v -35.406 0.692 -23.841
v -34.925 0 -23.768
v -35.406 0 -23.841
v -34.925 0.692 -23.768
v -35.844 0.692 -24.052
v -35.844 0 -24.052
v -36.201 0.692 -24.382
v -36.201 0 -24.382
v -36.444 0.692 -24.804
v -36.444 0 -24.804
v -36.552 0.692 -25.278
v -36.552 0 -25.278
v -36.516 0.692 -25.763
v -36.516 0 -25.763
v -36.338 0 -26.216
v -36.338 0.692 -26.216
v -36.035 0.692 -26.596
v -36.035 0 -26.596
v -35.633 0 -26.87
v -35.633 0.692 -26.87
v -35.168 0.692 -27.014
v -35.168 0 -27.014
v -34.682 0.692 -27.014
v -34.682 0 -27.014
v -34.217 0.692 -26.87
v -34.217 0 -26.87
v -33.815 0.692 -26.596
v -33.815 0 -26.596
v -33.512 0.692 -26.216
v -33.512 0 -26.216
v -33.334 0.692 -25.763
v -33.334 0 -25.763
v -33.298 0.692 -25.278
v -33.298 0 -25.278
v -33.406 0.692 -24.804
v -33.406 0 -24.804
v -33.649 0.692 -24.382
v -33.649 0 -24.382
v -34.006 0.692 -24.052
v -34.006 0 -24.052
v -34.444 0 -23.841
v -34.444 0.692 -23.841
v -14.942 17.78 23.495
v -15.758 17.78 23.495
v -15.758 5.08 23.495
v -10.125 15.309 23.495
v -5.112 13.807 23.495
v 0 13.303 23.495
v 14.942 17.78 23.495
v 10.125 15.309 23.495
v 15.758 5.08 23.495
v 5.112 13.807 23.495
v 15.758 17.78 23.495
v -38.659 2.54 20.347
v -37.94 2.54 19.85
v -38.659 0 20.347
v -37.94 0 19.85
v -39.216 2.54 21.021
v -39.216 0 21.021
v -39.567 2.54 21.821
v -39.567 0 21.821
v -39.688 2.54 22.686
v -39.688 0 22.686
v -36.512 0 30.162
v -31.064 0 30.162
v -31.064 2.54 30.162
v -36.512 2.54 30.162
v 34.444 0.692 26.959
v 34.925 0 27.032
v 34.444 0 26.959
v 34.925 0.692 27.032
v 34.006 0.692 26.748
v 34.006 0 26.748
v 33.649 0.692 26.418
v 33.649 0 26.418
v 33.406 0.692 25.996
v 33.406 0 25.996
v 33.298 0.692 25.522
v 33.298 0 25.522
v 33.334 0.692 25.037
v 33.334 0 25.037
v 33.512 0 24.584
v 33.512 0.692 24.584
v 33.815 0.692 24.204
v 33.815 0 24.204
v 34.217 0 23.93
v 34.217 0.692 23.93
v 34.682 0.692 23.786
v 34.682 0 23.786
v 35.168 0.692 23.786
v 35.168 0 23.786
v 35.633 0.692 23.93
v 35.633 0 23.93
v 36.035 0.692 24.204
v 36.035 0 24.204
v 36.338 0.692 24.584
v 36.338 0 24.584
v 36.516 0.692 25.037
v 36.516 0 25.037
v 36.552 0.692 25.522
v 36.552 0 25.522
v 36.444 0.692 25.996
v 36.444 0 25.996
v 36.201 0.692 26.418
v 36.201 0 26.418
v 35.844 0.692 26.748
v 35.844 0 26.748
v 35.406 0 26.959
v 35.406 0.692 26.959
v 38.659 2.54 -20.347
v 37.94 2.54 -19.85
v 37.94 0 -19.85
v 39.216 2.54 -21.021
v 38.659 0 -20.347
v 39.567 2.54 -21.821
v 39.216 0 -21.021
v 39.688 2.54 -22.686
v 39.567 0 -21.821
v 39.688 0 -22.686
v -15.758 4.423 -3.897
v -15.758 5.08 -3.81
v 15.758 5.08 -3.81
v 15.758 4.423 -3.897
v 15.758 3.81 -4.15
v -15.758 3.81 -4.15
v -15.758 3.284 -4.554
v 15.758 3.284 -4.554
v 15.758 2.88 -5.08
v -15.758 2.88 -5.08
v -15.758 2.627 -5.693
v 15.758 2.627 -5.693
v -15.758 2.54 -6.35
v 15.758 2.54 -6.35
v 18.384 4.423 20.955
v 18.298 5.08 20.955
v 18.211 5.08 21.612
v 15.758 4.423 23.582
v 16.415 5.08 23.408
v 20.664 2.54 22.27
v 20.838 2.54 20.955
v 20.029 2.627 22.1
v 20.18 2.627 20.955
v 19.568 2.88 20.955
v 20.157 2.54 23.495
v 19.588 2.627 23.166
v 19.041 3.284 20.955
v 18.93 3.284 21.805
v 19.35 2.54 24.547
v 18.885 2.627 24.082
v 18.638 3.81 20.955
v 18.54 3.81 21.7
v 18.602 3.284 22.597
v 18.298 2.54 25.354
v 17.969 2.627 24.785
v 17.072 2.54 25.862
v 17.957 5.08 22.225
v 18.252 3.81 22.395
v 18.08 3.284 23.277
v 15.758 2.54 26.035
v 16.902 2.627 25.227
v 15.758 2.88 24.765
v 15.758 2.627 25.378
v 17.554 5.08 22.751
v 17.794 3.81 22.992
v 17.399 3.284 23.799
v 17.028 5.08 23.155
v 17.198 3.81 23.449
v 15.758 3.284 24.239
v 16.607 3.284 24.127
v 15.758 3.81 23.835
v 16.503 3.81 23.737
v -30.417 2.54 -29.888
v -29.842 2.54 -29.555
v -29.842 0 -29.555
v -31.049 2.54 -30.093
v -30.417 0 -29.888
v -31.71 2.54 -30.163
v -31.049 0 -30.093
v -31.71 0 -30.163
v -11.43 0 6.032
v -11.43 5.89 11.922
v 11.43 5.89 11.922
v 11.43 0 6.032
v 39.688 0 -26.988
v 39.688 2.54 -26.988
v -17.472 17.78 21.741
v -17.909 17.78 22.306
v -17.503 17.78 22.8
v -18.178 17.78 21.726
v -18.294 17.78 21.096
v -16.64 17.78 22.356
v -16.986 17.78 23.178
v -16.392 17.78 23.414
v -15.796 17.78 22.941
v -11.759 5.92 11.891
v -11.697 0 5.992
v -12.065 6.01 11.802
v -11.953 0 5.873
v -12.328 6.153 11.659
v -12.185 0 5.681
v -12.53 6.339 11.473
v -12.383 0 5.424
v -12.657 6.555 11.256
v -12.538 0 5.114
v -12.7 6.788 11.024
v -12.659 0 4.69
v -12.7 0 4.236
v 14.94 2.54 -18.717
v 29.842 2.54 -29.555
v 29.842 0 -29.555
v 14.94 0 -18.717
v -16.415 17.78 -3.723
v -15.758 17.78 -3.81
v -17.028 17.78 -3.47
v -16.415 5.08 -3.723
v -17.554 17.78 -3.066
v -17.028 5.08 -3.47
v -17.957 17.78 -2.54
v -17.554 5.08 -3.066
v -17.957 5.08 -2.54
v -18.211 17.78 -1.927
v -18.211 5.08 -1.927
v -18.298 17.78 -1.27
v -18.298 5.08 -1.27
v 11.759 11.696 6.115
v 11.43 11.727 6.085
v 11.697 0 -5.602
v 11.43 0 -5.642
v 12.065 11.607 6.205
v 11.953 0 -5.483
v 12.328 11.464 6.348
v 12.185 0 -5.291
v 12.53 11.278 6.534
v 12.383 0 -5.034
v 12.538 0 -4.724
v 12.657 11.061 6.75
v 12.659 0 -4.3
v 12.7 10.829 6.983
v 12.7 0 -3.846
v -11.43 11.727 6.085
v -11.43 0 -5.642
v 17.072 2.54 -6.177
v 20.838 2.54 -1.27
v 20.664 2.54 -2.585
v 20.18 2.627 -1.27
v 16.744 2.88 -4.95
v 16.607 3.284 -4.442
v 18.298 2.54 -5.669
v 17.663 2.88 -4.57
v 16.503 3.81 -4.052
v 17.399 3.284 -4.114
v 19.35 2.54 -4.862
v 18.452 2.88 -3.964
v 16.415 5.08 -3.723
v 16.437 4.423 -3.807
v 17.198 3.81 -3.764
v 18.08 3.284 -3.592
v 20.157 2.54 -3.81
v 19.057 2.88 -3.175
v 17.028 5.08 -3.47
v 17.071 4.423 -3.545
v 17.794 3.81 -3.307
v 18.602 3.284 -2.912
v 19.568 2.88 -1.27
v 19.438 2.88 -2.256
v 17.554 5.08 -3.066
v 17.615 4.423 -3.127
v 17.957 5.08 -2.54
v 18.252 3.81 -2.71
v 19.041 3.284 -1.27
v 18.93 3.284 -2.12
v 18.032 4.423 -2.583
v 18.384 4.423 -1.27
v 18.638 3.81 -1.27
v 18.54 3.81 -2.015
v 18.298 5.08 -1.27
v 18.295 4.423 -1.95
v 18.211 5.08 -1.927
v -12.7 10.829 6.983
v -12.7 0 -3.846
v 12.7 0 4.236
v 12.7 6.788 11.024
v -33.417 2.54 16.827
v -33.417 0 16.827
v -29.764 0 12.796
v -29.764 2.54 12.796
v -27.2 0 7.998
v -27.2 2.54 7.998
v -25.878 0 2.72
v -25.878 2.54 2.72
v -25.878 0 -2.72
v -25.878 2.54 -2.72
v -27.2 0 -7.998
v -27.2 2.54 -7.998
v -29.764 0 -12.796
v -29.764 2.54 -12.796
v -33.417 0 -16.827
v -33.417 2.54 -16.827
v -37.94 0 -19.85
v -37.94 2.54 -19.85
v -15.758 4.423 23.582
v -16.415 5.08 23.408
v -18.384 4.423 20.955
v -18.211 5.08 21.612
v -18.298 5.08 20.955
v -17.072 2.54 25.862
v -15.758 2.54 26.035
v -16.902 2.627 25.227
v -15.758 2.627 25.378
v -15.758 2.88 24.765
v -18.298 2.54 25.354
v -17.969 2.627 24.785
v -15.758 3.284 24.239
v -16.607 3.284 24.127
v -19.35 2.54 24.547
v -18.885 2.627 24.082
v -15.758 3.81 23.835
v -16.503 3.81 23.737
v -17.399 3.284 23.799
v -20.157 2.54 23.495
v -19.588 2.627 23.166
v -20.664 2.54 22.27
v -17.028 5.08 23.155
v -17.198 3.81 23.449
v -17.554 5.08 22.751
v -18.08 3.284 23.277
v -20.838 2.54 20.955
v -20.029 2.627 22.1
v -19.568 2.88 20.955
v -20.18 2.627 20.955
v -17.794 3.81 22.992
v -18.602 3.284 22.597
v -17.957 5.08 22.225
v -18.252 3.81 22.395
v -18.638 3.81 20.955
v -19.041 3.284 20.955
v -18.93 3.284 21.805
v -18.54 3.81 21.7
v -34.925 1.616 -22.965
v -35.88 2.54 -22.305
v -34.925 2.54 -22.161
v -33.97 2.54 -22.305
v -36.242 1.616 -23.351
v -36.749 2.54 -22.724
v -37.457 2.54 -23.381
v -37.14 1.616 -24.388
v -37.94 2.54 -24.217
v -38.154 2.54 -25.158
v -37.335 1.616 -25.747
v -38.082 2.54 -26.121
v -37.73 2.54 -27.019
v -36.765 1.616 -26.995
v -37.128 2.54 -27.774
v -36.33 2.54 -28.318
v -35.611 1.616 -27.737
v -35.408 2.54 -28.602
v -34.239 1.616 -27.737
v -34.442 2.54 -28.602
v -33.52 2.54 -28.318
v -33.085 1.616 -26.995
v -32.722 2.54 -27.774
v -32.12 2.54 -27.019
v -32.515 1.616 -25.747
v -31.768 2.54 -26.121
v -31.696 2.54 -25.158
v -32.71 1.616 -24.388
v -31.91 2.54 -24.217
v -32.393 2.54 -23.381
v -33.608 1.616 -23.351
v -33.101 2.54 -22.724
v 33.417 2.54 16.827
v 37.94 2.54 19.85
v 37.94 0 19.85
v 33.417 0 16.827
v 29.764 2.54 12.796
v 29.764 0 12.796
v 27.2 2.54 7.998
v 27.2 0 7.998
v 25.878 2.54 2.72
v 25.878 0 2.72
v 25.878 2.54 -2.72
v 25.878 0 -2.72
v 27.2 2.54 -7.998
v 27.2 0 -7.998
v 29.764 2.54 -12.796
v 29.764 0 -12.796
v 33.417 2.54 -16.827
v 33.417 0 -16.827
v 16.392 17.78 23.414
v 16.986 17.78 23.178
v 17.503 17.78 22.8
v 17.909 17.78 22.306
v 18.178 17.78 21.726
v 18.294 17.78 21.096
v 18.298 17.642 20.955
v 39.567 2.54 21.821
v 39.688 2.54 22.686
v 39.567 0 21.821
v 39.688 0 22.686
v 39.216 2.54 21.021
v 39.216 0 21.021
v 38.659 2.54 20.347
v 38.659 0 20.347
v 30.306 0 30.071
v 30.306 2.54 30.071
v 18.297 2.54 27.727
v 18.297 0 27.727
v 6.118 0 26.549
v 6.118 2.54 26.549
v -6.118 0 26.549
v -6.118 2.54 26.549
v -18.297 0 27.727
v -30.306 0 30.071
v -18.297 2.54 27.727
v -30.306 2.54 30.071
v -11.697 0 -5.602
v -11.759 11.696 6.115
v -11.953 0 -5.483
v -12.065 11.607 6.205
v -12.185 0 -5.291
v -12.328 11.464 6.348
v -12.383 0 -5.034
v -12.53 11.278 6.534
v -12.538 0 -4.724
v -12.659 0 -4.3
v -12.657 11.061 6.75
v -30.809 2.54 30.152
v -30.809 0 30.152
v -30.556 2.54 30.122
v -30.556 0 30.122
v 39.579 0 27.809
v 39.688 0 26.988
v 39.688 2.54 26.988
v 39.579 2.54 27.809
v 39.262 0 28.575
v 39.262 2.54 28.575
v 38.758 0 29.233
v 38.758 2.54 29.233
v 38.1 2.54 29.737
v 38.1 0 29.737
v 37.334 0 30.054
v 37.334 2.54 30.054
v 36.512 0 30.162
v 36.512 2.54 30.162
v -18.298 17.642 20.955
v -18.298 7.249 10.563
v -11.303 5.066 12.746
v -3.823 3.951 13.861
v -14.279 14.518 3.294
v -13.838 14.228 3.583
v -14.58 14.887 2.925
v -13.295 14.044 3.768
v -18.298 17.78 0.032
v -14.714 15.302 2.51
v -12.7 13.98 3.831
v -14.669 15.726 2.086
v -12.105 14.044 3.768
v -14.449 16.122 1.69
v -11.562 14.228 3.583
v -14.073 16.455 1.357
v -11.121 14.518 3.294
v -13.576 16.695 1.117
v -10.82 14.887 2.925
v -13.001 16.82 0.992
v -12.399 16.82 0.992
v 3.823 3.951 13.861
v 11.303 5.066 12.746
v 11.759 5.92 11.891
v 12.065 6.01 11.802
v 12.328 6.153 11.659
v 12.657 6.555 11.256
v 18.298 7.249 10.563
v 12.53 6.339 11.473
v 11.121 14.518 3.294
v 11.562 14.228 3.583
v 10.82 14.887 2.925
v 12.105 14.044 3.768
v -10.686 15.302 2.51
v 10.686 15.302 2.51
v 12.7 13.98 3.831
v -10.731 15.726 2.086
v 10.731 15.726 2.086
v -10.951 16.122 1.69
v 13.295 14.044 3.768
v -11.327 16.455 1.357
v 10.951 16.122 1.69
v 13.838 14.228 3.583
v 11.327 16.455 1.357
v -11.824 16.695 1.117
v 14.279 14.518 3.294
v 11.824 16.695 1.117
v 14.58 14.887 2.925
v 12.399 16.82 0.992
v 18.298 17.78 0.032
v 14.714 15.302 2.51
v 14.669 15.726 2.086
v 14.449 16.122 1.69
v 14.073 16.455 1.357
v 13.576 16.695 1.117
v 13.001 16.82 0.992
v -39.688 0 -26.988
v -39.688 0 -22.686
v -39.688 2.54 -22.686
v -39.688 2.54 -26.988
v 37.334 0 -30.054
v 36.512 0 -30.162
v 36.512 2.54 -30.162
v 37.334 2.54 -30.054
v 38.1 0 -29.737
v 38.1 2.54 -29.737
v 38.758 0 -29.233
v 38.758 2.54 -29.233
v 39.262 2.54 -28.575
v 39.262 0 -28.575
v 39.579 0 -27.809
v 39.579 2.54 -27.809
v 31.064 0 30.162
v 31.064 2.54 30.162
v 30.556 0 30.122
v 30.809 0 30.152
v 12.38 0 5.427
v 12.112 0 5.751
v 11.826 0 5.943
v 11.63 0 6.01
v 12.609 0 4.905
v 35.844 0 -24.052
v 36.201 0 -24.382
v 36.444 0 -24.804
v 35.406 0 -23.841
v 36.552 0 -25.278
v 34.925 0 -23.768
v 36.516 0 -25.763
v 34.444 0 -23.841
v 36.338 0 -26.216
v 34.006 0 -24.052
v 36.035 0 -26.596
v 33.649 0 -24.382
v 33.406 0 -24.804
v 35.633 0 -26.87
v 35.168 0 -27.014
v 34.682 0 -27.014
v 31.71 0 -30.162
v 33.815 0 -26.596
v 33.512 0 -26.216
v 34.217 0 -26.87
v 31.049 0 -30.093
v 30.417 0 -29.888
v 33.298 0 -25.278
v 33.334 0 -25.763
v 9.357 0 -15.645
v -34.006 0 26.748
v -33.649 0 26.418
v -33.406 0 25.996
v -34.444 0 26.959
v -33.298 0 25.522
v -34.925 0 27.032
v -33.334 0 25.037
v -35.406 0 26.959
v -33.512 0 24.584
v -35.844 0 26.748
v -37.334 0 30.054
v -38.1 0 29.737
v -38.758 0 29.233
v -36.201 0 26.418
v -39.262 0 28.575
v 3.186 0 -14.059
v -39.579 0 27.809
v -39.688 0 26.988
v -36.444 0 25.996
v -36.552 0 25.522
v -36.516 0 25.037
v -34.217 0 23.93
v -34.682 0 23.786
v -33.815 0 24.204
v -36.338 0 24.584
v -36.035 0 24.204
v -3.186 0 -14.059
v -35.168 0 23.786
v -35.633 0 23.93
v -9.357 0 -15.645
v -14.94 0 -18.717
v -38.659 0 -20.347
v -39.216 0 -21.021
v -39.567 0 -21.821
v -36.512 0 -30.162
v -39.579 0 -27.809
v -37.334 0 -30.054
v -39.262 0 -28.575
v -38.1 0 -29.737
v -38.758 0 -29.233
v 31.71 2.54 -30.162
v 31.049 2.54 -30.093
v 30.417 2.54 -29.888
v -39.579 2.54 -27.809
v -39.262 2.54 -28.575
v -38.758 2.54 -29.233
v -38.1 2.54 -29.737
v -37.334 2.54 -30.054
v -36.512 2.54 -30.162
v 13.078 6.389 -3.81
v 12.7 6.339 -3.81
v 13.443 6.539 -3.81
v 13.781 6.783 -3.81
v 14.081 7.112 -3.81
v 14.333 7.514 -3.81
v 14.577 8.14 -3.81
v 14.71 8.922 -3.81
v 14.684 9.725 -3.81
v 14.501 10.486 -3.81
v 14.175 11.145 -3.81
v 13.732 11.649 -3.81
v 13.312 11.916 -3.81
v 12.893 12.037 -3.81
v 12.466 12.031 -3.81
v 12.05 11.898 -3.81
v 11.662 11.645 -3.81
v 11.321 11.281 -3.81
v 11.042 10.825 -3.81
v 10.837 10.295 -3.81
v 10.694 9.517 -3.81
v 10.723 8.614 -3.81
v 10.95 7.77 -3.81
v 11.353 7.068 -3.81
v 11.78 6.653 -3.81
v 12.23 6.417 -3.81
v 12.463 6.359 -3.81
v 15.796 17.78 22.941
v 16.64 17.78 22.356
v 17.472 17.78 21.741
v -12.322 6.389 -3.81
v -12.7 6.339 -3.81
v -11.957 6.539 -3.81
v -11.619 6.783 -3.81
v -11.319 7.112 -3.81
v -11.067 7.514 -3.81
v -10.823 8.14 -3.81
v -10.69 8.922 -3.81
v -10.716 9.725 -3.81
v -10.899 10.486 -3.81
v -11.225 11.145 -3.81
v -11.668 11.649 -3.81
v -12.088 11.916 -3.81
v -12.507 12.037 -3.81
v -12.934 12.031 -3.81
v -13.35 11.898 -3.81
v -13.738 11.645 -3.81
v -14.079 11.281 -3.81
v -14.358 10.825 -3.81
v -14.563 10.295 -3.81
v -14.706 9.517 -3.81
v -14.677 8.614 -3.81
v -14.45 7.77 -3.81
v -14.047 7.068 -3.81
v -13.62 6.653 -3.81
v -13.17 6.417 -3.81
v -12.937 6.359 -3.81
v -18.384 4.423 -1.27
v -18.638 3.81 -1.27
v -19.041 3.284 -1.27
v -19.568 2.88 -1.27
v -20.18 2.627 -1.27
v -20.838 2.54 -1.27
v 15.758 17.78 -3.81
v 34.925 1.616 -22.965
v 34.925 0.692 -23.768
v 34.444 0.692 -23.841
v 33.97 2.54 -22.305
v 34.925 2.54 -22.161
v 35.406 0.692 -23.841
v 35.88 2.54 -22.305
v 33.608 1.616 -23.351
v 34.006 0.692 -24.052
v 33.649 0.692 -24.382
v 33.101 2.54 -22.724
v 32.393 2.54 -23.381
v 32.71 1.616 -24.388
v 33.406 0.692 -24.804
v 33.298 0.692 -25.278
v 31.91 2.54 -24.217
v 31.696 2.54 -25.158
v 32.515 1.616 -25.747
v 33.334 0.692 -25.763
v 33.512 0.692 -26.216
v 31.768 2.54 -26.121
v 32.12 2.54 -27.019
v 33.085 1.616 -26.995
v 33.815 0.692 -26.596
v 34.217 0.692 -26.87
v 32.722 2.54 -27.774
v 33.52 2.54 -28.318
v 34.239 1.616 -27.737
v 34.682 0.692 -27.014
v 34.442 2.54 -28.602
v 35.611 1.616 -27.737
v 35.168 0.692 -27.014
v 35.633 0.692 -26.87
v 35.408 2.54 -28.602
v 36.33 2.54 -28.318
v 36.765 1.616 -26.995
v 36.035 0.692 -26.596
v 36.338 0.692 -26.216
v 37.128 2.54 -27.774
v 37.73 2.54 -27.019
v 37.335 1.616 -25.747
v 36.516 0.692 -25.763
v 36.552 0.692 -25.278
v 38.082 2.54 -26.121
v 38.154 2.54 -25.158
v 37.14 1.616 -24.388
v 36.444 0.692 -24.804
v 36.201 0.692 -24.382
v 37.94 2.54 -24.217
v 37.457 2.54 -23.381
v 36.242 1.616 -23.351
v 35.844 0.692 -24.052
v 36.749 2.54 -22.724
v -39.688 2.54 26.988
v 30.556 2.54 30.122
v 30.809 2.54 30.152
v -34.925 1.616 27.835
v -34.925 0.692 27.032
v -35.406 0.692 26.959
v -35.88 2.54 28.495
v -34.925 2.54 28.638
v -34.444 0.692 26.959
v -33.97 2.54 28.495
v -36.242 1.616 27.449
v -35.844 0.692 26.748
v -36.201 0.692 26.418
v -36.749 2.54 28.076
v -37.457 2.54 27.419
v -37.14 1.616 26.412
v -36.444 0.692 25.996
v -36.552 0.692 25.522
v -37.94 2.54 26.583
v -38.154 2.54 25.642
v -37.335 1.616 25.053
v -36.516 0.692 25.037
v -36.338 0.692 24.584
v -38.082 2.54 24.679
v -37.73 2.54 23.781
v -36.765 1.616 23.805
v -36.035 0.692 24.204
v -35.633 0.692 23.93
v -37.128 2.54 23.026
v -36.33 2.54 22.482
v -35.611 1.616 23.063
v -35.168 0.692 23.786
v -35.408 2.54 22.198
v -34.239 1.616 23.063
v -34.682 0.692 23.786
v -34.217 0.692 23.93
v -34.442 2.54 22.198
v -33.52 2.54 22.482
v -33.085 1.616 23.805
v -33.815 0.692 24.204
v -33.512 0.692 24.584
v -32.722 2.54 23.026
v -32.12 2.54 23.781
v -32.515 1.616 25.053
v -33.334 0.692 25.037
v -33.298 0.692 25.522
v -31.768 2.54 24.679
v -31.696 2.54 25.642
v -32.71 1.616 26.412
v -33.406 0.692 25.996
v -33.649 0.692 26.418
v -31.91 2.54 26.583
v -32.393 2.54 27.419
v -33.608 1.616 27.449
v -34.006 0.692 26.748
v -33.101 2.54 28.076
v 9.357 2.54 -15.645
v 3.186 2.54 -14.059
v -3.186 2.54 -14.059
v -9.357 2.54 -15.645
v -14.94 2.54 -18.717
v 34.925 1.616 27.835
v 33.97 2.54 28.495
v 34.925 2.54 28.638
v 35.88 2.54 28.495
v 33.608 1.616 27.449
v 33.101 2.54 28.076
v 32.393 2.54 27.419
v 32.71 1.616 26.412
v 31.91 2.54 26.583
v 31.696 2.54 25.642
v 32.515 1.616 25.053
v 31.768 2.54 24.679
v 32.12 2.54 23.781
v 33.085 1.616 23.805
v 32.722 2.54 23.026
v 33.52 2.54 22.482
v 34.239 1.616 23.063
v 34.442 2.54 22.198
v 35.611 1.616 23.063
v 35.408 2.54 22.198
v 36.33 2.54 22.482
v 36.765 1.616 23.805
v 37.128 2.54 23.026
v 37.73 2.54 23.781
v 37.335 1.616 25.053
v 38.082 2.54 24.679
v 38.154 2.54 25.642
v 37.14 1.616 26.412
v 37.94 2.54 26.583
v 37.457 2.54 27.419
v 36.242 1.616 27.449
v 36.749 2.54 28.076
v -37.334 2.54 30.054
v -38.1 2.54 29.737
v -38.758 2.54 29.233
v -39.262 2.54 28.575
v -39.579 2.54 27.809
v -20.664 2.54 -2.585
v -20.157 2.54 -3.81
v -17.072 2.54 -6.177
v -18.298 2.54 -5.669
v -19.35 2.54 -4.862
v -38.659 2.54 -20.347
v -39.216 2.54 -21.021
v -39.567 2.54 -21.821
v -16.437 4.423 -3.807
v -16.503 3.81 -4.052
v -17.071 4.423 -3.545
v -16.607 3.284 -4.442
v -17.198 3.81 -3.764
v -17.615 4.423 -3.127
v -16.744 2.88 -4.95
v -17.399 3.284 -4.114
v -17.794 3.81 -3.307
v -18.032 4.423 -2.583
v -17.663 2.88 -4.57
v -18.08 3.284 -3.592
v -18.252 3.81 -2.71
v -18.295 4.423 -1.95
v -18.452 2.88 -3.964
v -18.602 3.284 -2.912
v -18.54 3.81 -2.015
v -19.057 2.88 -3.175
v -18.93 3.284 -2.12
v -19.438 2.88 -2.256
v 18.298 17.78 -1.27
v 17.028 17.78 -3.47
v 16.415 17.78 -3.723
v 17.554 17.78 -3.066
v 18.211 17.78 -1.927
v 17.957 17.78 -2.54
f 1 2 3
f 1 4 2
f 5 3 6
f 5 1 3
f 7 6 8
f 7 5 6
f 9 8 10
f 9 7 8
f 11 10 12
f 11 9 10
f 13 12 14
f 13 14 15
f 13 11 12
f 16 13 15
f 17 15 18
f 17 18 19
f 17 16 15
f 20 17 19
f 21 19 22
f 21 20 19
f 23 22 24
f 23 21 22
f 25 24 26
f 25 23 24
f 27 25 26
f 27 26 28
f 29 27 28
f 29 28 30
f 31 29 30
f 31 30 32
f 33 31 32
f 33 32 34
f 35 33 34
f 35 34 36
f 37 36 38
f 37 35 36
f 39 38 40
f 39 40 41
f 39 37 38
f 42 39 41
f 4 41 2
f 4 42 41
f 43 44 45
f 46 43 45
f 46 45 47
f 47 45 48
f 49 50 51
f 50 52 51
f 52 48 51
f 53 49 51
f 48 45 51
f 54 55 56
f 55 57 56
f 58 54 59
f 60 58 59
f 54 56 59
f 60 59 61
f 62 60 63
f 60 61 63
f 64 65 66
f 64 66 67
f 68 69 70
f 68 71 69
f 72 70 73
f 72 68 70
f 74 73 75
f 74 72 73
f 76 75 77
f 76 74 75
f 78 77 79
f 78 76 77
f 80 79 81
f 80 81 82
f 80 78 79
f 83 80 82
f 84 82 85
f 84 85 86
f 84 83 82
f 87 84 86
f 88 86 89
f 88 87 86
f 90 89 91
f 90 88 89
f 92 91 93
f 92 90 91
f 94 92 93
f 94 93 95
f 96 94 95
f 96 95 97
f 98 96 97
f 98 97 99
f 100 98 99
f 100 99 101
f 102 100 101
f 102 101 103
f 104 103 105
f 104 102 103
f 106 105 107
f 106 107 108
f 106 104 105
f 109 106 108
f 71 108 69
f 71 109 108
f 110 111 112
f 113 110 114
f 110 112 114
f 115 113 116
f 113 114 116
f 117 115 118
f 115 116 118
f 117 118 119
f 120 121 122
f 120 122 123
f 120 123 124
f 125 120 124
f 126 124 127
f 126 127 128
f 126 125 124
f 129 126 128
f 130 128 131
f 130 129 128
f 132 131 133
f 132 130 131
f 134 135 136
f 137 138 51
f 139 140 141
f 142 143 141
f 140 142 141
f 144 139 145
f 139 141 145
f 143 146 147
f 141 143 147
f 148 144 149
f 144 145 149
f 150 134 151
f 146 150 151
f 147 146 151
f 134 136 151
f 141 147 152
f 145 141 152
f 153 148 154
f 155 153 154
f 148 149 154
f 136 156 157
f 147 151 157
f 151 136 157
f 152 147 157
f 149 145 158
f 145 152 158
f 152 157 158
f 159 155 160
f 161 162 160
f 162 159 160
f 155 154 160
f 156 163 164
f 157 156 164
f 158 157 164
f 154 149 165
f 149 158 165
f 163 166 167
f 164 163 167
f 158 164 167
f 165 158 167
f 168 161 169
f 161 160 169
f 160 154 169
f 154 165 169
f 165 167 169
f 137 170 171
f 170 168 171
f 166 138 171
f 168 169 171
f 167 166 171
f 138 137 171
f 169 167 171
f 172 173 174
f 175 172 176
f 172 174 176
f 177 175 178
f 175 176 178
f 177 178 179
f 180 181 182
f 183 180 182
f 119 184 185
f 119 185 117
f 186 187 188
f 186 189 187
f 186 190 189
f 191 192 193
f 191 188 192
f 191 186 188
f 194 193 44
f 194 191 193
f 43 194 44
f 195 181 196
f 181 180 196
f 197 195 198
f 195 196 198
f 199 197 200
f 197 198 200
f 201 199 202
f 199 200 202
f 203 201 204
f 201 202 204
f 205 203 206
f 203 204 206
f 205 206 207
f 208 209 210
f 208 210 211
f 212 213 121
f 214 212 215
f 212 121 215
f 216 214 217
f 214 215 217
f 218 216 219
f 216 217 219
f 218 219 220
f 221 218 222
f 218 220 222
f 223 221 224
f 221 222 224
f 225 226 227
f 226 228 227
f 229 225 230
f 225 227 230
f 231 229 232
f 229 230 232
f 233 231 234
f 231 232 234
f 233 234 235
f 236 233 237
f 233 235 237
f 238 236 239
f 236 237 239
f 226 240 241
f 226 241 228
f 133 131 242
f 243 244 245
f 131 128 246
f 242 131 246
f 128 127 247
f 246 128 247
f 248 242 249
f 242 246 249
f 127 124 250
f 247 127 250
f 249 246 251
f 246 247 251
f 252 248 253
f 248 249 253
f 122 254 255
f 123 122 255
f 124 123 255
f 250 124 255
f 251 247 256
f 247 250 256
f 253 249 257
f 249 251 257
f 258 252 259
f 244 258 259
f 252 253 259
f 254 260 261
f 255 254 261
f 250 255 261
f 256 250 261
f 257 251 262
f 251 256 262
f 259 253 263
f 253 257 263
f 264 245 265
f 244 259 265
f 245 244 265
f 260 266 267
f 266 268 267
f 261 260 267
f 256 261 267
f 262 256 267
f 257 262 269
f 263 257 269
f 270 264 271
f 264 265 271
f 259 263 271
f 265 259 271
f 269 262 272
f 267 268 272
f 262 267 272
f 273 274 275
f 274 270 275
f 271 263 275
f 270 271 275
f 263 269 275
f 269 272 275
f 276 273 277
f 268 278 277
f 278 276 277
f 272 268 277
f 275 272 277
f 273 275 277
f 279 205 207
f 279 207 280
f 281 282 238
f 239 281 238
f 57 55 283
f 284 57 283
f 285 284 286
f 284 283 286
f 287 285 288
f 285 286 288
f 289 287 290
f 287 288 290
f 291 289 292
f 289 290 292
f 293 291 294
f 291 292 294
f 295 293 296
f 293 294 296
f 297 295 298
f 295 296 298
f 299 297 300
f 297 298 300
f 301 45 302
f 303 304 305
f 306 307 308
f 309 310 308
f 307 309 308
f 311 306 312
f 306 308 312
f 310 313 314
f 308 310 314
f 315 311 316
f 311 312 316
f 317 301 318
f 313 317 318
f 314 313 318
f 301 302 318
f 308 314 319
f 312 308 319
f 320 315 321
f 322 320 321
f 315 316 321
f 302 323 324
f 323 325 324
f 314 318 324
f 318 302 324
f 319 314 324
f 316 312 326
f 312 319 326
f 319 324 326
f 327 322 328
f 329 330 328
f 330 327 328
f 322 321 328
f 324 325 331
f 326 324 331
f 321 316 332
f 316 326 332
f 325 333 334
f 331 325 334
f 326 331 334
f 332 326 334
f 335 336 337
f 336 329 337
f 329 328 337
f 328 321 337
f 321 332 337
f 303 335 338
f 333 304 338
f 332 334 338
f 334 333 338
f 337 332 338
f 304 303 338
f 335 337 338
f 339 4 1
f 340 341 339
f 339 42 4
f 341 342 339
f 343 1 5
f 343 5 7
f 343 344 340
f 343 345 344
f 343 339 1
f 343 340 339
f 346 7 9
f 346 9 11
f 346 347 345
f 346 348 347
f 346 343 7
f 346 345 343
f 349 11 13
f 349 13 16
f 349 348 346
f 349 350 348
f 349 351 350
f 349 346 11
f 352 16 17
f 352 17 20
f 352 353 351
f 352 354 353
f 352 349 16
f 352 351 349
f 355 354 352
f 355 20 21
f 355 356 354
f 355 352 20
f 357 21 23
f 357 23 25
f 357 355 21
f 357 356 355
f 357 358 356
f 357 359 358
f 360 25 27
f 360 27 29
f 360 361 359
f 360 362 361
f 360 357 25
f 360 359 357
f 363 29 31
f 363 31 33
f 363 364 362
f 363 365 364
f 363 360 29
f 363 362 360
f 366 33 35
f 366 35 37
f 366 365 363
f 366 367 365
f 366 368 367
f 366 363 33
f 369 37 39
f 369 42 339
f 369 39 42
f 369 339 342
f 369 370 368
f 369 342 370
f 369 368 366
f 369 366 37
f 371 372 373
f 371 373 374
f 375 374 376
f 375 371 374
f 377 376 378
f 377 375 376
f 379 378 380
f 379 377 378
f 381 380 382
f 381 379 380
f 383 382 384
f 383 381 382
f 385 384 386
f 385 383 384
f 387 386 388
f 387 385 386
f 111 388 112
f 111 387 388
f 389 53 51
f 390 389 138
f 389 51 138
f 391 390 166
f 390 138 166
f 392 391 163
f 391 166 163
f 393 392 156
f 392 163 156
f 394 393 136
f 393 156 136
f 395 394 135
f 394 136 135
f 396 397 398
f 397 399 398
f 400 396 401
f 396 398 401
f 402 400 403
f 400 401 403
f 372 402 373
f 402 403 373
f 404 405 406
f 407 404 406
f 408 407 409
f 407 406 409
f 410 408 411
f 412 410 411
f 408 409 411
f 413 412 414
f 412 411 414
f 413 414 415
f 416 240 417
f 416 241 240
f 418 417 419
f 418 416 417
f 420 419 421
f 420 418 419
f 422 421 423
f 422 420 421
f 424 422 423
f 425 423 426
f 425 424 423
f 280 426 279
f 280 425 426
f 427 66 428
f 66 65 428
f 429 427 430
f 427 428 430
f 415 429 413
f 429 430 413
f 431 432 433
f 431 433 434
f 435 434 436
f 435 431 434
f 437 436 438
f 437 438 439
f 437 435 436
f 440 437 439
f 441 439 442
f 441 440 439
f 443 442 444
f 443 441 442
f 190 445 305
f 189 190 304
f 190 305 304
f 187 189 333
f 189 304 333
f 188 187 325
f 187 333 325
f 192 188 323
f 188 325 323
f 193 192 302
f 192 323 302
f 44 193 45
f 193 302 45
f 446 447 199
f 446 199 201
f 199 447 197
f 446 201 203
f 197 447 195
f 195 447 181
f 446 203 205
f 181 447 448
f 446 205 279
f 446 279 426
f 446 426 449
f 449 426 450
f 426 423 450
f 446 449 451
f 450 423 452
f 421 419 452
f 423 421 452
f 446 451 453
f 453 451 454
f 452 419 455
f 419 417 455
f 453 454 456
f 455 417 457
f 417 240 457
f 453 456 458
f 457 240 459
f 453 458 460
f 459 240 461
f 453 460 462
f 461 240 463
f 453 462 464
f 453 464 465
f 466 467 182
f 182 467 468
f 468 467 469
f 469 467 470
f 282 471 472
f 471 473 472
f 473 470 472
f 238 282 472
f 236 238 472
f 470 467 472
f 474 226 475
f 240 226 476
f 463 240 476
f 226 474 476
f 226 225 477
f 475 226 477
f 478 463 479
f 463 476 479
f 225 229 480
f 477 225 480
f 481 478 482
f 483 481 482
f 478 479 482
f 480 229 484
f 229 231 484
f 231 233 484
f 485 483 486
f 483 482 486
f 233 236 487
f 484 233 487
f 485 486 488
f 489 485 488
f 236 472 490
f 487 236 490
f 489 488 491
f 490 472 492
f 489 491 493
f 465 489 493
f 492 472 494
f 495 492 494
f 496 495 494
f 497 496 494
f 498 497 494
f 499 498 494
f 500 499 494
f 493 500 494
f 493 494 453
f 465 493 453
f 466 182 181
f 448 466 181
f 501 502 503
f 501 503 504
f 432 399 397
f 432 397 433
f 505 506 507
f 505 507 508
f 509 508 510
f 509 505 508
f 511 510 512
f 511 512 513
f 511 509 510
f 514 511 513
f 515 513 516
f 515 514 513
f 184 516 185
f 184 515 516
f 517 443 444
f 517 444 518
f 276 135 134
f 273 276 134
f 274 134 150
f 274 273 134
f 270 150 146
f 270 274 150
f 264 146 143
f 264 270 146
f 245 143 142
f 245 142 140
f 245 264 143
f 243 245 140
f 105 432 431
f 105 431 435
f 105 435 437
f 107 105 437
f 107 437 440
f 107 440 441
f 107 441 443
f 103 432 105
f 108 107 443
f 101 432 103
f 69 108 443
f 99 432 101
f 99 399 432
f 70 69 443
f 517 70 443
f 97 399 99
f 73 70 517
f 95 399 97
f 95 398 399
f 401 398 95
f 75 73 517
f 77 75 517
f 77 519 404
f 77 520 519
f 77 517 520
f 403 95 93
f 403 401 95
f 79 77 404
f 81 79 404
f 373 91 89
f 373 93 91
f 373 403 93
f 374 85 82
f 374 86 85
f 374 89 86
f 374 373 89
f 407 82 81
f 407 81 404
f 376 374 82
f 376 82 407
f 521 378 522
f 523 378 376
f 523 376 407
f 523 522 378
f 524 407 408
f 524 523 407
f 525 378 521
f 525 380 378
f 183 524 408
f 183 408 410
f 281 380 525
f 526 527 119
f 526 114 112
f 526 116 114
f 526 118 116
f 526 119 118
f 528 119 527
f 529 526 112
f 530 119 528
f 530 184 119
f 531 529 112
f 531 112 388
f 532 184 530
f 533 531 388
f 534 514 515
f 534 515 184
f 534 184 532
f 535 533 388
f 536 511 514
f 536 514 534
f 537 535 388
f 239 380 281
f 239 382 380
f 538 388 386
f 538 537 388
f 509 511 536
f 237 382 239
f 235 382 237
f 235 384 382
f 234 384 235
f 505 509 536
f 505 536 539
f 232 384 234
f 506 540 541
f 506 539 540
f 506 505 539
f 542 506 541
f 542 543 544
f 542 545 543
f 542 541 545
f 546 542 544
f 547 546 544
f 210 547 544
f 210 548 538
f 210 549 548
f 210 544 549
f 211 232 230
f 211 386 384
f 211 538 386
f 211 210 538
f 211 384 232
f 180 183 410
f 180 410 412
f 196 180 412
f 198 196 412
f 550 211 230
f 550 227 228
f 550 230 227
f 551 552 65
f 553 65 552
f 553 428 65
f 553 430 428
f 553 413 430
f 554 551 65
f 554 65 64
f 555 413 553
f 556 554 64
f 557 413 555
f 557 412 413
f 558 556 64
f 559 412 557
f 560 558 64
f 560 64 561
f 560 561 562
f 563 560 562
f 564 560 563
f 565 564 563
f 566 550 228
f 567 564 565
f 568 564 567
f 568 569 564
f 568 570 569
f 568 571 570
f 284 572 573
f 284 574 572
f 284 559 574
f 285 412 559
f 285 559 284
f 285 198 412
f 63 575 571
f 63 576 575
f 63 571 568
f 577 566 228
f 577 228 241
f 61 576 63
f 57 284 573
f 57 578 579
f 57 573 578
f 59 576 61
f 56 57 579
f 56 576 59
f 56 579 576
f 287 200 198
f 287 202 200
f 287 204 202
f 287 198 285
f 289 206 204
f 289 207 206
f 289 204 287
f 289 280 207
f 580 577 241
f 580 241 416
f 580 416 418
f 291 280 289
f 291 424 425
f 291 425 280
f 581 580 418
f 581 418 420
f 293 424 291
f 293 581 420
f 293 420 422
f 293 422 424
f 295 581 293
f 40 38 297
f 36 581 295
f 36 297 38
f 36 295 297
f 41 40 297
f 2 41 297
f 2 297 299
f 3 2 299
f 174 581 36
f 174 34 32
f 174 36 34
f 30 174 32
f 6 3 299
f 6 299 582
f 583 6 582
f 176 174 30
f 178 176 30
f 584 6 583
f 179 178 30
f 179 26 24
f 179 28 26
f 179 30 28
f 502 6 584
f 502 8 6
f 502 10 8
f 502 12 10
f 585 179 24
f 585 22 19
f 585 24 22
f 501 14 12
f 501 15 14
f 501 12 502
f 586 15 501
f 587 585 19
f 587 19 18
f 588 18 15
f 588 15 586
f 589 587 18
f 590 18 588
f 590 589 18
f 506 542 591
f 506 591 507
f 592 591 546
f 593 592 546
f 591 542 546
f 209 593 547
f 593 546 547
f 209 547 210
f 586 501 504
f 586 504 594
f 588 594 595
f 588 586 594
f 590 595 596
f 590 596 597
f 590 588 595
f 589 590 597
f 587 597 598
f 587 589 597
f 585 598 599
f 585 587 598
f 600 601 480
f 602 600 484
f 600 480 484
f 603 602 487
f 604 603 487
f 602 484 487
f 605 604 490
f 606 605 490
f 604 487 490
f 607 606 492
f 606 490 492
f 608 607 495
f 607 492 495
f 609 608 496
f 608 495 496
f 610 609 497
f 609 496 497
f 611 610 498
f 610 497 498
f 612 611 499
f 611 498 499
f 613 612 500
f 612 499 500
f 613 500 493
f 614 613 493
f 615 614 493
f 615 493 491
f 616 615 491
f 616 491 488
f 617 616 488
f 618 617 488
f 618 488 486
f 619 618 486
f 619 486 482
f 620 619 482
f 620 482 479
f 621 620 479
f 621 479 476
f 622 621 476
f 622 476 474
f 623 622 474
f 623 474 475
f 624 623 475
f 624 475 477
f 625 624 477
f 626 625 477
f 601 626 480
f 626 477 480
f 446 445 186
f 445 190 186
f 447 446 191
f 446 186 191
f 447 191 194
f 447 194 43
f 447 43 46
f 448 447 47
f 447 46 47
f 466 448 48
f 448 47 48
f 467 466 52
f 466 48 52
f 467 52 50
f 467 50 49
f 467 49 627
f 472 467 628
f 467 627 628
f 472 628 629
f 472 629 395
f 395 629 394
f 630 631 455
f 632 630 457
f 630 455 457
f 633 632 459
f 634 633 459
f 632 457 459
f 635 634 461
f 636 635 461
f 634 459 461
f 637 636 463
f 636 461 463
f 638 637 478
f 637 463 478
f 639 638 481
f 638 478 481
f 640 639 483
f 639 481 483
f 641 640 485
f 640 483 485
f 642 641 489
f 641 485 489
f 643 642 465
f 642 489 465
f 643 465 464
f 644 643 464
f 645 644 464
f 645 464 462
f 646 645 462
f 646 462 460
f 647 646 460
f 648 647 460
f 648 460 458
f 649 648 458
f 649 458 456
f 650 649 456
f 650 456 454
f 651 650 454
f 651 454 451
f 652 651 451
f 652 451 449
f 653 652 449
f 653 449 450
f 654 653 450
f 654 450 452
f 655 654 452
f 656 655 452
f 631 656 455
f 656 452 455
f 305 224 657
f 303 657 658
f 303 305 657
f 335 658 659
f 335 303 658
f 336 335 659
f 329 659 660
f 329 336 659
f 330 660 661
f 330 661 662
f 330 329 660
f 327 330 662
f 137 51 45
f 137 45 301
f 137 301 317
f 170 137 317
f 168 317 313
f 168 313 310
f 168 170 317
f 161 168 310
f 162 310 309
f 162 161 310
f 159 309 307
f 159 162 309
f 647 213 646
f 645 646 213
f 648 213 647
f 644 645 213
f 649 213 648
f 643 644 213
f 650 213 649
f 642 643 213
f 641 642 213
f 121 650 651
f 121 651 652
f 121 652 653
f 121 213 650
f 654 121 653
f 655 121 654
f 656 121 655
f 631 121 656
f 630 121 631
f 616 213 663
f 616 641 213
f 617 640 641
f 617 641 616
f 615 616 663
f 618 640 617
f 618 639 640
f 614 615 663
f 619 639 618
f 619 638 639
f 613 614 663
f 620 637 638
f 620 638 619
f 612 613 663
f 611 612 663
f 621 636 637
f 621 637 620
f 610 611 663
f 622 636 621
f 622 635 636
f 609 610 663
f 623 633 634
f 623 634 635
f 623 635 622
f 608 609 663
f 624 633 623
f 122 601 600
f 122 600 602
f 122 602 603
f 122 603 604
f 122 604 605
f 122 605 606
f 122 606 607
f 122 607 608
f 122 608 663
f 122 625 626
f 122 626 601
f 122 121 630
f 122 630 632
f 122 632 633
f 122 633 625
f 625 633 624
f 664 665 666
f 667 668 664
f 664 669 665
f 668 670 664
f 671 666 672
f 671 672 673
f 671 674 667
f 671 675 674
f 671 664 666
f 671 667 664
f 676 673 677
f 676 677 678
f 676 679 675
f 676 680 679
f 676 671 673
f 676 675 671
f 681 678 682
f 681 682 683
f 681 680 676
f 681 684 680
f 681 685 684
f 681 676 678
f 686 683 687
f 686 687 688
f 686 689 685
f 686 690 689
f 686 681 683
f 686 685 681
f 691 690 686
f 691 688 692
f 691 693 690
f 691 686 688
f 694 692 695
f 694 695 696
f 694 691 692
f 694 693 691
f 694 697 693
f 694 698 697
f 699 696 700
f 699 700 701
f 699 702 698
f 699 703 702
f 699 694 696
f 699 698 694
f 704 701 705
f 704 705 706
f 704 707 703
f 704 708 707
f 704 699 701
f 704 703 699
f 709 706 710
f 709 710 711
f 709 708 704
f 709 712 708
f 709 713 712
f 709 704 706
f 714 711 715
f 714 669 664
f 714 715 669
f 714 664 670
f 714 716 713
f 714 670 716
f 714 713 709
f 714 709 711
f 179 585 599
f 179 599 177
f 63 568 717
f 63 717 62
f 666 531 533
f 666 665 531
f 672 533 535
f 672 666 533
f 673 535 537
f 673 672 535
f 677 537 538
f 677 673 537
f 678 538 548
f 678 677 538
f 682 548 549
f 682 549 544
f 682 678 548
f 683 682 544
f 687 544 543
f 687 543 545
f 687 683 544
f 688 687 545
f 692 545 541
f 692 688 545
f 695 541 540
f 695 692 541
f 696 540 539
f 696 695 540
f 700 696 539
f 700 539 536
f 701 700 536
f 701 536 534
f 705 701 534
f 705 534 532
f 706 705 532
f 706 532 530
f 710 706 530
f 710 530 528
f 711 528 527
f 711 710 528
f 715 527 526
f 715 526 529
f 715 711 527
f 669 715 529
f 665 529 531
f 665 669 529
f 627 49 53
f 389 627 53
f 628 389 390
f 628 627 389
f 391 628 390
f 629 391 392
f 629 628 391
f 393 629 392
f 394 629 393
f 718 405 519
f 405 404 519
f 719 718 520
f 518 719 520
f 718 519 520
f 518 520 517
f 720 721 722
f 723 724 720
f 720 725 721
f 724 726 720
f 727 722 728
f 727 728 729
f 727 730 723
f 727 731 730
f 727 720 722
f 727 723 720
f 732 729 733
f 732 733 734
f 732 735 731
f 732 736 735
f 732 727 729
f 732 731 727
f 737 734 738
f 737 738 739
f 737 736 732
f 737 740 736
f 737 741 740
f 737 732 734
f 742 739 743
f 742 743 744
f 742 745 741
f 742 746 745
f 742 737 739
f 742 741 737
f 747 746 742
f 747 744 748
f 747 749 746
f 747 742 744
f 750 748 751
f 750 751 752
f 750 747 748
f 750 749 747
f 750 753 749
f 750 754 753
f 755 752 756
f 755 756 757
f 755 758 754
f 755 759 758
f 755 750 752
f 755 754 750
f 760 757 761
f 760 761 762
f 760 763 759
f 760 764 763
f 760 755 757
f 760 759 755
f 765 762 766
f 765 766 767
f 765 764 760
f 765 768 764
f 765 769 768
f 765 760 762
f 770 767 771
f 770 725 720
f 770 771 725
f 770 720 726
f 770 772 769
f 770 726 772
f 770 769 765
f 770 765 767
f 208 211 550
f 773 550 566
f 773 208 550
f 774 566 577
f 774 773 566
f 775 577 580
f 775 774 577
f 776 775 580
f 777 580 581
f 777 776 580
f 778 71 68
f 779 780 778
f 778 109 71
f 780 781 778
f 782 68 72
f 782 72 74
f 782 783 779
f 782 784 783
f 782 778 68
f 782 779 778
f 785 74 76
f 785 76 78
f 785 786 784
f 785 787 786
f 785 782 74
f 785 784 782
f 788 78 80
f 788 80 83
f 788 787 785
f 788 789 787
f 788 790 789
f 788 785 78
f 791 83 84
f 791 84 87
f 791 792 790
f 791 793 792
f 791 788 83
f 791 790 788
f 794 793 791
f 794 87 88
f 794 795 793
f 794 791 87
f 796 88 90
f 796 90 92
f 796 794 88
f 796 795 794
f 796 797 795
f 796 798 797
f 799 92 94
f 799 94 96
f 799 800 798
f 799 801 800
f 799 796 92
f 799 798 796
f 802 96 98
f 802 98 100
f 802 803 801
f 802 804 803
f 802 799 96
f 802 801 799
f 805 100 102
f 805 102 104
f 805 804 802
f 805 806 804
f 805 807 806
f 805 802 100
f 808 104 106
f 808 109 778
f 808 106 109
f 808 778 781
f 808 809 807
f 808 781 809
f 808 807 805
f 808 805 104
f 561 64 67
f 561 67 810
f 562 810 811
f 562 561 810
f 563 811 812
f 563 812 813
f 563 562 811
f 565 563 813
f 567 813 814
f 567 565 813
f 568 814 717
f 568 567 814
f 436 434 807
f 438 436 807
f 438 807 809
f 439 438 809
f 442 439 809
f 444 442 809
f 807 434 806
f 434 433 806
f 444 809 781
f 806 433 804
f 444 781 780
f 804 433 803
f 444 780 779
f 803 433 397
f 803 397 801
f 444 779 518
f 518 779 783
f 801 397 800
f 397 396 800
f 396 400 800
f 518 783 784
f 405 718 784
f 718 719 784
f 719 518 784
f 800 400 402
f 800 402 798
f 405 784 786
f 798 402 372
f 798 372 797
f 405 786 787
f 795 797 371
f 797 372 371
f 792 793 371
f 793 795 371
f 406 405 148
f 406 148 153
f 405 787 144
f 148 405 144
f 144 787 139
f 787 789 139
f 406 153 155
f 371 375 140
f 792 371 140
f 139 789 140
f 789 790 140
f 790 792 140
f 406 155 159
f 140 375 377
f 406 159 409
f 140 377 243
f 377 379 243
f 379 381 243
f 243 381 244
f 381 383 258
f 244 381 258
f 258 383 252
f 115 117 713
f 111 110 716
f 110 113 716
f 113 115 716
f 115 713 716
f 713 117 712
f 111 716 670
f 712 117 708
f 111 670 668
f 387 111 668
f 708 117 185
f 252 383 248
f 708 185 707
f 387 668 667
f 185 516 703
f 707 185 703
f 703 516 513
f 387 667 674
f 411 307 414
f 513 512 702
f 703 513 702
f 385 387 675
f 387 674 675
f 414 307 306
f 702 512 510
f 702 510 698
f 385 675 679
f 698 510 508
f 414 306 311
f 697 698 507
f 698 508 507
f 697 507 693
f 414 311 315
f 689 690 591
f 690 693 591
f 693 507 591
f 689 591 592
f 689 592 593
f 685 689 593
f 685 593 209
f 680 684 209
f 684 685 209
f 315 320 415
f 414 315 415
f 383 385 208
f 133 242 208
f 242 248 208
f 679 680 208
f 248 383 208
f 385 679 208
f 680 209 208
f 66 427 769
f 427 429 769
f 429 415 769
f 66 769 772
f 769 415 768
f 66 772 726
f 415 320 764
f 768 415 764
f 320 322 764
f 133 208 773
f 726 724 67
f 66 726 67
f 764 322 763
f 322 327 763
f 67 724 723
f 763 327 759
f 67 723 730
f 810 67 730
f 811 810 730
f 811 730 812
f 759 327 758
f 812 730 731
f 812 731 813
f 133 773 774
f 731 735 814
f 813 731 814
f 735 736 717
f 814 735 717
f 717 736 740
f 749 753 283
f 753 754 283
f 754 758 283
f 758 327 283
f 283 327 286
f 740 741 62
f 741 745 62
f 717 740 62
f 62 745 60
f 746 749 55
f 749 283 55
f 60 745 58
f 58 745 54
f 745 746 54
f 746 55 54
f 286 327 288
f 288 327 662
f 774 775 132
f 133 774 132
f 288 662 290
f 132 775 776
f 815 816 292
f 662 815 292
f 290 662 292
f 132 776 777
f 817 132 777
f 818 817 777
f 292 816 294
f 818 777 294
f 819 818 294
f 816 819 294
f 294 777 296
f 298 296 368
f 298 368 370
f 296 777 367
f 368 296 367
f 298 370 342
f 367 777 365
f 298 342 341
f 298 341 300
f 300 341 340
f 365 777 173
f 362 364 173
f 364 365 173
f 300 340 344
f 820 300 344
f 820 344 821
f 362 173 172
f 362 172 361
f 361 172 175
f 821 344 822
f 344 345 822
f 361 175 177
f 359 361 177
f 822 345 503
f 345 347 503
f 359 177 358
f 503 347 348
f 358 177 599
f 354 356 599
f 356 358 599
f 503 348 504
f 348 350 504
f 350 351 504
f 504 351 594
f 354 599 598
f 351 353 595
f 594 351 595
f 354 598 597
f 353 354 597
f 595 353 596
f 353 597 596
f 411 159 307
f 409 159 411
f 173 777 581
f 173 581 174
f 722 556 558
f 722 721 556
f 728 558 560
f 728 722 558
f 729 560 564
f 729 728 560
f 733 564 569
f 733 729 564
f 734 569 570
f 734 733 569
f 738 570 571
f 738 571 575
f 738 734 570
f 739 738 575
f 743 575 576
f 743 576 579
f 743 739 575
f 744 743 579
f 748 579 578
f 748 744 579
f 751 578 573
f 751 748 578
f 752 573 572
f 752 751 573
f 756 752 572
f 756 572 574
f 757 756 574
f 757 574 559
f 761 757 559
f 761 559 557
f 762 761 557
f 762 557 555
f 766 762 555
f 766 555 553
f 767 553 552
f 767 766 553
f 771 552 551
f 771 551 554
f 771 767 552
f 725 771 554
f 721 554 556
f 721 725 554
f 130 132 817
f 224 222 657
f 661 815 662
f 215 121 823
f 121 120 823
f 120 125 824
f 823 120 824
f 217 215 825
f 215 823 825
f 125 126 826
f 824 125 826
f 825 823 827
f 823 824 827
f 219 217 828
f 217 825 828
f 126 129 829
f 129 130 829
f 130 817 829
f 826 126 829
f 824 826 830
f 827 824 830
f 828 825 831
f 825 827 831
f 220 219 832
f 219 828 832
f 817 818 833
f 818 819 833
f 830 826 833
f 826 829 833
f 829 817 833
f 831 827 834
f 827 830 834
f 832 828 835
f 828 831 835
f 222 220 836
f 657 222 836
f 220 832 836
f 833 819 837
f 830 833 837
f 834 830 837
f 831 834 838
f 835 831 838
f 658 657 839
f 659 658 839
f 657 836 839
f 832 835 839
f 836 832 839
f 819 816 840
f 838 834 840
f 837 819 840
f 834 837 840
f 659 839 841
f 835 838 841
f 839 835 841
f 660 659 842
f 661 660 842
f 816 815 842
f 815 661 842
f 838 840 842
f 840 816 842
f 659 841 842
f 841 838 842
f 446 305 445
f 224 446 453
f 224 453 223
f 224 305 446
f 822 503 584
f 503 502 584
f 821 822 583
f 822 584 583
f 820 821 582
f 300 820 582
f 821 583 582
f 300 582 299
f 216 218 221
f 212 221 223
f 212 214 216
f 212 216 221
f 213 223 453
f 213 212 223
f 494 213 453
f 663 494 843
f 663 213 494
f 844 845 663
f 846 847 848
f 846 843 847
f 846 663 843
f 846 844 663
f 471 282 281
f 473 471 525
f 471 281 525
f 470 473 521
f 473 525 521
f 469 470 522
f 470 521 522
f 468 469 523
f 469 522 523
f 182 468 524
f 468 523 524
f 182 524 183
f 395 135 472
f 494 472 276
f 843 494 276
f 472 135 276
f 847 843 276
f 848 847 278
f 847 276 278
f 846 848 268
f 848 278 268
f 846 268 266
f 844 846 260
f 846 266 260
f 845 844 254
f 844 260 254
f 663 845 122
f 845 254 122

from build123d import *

# Parameters (mm, degrees)
BOSS_EXTRUDE1_DEPTH                           = 2.54
CSK_FOR_4_FLAT_HEAD_MACHINE_SCREW1_AT_2_COUNT = 2
CSK_FOR_4_FLAT_HEAD_MACHINE_SCREW1_AT_2_PITCH = 50.8
CSK_FOR_4_FLAT_HEAD_MACHINE_SCREW1_AT_3_COUNT = 2
CSK_FOR_4_FLAT_HEAD_MACHINE_SCREW1_AT_3_PITCH = 86.36933773
CSK_FOR_4_FLAT_HEAD_MACHINE_SCREW1_AT_4_COUNT = 2
CSK_FOR_4_FLAT_HEAD_MACHINE_SCREW1_AT_4_PITCH = 69.85
SKETCH5_W                                     = 36.59505
SKETCH5_H                                     = 27.305
BOSS_EXTRUDE2_DEPTH                           = 15.24
CUT_EXTRUDE2_REACH                            = 58.398
SKETCH8_R                                     = 2.0193
FILLET1_R                                     = 2.54
CUT_EXTRUDE4_DEPTH                            = 3.429
FILLET2_R                                     = 3.175
SKETCH10_W                                    = 25.4
SKETCH10_H                                    = 8.255
CUT_EXTRUDE5_DEPTH                            = 57.398148028
FILLET3_R                                     = 1.27


with BuildPart() as part:
    # Sketch1 → Boss-Extrude1 (new body)
    with BuildSketch(Plane(origin=(0, 0, 0), x_dir=(1, 0, 0), z_dir=(0, 1, 0))):
        with BuildLine():
            Line((-36.5125, 30.1625), (36.5125, 30.1625))
            ThreePointArc((36.5125, 30.1625), (38.75756403, 29.23256403), (39.6875, 26.9875))
            Line((39.6875, 26.9875), (39.6875, -26.9875))
            ThreePointArc((39.6875, -26.9875), (38.75756403, -29.23256403), (36.5125, -30.1625))
            Line((36.5125, -30.1625), (-36.5125, -30.1625))
            ThreePointArc((-36.5125, -30.1625), (-38.75756403, -29.23256403), (-39.6875, -26.9875))
            Line((-39.6875, -26.9875), (-39.6875, 26.9875))
            ThreePointArc((-39.6875, 26.9875), (-38.75756403, 29.23256403), (-36.5125, 30.1625))
        make_face()
    extrude(amount=BOSS_EXTRUDE1_DEPTH)

    # Sketch3 → CSK for #4 Flat Head Machine Screw1 (revolve, cut)
    with BuildSketch(Plane(origin=(-34.925, 2.54, -25.4), x_dir=(0, 0, 1), z_dir=(1, 0, 0))):
        Polygon((0, 0), (0, 2.54), (1.63195, 2.54), (1.63195, 1.848124365), (3.2385, 0), align=None)
    csk_for_4_flat_head_machine_screw1 = revolve(axis=Axis((-34.925, 8.89, -25.4), (0, -1, 0)), mode=Mode.SUBTRACT)

    # CSK for #4 Flat Head Machine Screw1 at 2: CSK for #4 Flat Head Machine Screw1 ×2
    with Locations(*[(0, 0, i * CSK_FOR_4_FLAT_HEAD_MACHINE_SCREW1_AT_2_PITCH) for i in range(1, CSK_FOR_4_FLAT_HEAD_MACHINE_SCREW1_AT_2_COUNT)]):
        add(csk_for_4_flat_head_machine_screw1, mode=Mode.SUBTRACT)

    # CSK for #4 Flat Head Machine Screw1 at 3: CSK for #4 Flat Head Machine Screw1 ×2
    with Locations(*[Vector(0.8087360843031886, 0, 0.5881716976750463) * (i * CSK_FOR_4_FLAT_HEAD_MACHINE_SCREW1_AT_3_PITCH) for i in range(1, CSK_FOR_4_FLAT_HEAD_MACHINE_SCREW1_AT_3_COUNT)]):
        add(csk_for_4_flat_head_machine_screw1, mode=Mode.SUBTRACT)

    # CSK for #4 Flat Head Machine Screw1 at 4: CSK for #4 Flat Head Machine Screw1 ×2
    with Locations(*[(i * CSK_FOR_4_FLAT_HEAD_MACHINE_SCREW1_AT_4_PITCH, 0, 0) for i in range(1, CSK_FOR_4_FLAT_HEAD_MACHINE_SCREW1_AT_4_COUNT)]):
        add(csk_for_4_flat_head_machine_screw1, mode=Mode.SUBTRACT)

    # Sketch5 → Boss-Extrude2 (add)
    with BuildSketch(Plane(origin=(0, 2.54, 0), x_dir=(1, 0, 0), z_dir=(0, 1, 0))):
        with Locations((0, -9.8425)):
            Rectangle(SKETCH5_W, SKETCH5_H)
    extrude(amount=BOSS_EXTRUDE2_DEPTH)

    # Sketch4 → Cut-Revolve1 (revolve, cut)
    with BuildSketch(Plane(origin=(0, 0, 0), x_dir=(0, 0, -1), z_dir=(1, 0, 0))):
        Polygon((-32.244261254, 22.052492284), (-6.188048119, 48.10870542), (12.054444166, 29.866213135), (-14.00176897, 3.81), align=None)
    revolve(axis=Axis((0, 29.866213135, -12.054444166), (0, 0.7071067811865511, 0.707106781186544)), mode=Mode.SUBTRACT)

    # Cut-Extrude2: up to this plane
    cut_extrude2_end = Plane(origin=(-18.297525, 17.78, -3.81), z_dir=(0, 0, 1))
    # Sketch8 → Cut-Extrude2 (cut, up to the surface)
    with BuildSketch(Plane(origin=(0, 8.905884485, 8.905884485), x_dir=(1, 0, 0), z_dir=(0, 0.7071067811865511, 0.707106781186544)), mode=Mode.PRIVATE) as cut_extrude2_sk1:
        with Locations(Location((-12.7, 9.195689, 0), (0, 0, 270))):
            Circle(SKETCH8_R)
    cut_extrude2_tool1 = split(extrude(cut_extrude2_sk1.sketch, amount=-CUT_EXTRUDE2_REACH, mode=Mode.PRIVATE), bisect_by=cut_extrude2_end, keep=Keep.BOTH, mode=Mode.PRIVATE)
    add(cut_extrude2_tool1.solids().sort_by_distance((-12.7, 15.408219, 2.40355))[0], mode=Mode.SUBTRACT)
    # Sketch8 → Cut-Extrude2 (cut, up to the surface)
    with BuildSketch(Plane(origin=(0, 8.905884485, 8.905884485), x_dir=(1, 0, 0), z_dir=(0, 0.7071067811865511, 0.707106781186544)), mode=Mode.PRIVATE) as cut_extrude2_sk2:
        with Locations(Location((12.7, 9.195689, 0), (0, 0, 270))):
            Circle(SKETCH8_R)
    cut_extrude2_tool2 = split(extrude(cut_extrude2_sk2.sketch, amount=-CUT_EXTRUDE2_REACH, mode=Mode.PRIVATE), bisect_by=cut_extrude2_end, keep=Keep.BOTH, mode=Mode.PRIVATE)
    add(cut_extrude2_tool2.solids().sort_by_distance((12.7, 15.408219, 2.40355))[0], mode=Mode.SUBTRACT)

    # Fillet1
    # the kernel refuses this fillet: 2.54 mm, written as the material it takes off along each edge
    with BuildSketch(Plane(origin=(18.297525, 2.54, -3.81), x_dir=(-1, 0, 0), z_dir=(0, 1, 0)), Plane(origin=(18.297525, 2.54, 23.495), x_dir=(0, 0, -1), z_dir=(0, 1, 0)), Plane(origin=(-18.297525, 2.54, 23.495), x_dir=(1, 0, 0), z_dir=(0, 1, 0))) as fillet1_piece_1:
        with BuildLine():
            CenterArc((FILLET1_R, FILLET1_R), FILLET1_R, 180, 90)
            Line((0, FILLET1_R), (0, 0))
            Line((0, 0), (FILLET1_R, 0))
        make_face()
    extrude(amount=21.59, mode=Mode.SUBTRACT)
    with BuildSketch(Plane(origin=(-18.297525, 2.54, -3.81), x_dir=(1, 0, 0), z_dir=(0, 1, 0))) as fillet1_piece_2:
        with BuildLine():
            CenterArc((FILLET1_R, -FILLET1_R), FILLET1_R, 90, 90)
            Line((0, -FILLET1_R), (0, 0))
            Line((0, 0), (FILLET1_R, 0))
        make_face()
    extrude(amount=21.59, mode=Mode.SUBTRACT)
    # the kernel refuses this fillet: 2.54 mm, written as the material it adds along each edge
    with BuildSketch(Plane(origin=(-15.757525, 2.54, -3.81), x_dir=(0, 0, -1), z_dir=(1, 0, 0)), Plane(origin=(15.757525, 2.54, 23.495), x_dir=(0, 0, 1), z_dir=(-1, 0, 0))) as fillet1_2_piece_1:
        with BuildLine():
            CenterArc((FILLET1_R, FILLET1_R), FILLET1_R, 180, 90)
            Line((0, FILLET1_R), (0, 0))
            Line((0, 0), (FILLET1_R, 0))
        make_face()
    extrude(amount=31.51505)
    with BuildSketch(Plane(origin=(18.297525, 2.54, -1.27), x_dir=(1, 0, 0), z_dir=(0, 0, 1)), Plane(origin=(-18.297525, 2.54, 20.955), x_dir=(-1, 0, 0), z_dir=(0, 0, -1))) as fillet1_2_piece_2:
        with BuildLine():
            CenterArc((FILLET1_R, FILLET1_R), FILLET1_R, 180, 90)
            Line((0, FILLET1_R), (0, 0))
            Line((0, 0), (FILLET1_R, 0))
        make_face()
    extrude(amount=22.225)
    with BuildSketch(Plane(origin=(-15.757525, 2.54, 20.955), x_dir=(0, 0, 1), z_dir=(1, 0, 0))) as fillet1_2_piece_3:
        with BuildLine():
            CenterArc((2.54 + FILLET1_R, -FILLET1_R), FILLET1_R, 90, 90)
            Line((2.54, -FILLET1_R), (2.54, 0))
            Line((2.54, 0), (2.54 + FILLET1_R, 0))
        make_face()
    revolve(axis=Axis((-15.757525, 2.54, 20.955), (0, -1, 0)), revolution_arc=90)
    with BuildSketch(Plane(origin=(-15.757525, 2.54, -1.27), x_dir=(0, 0, -1), z_dir=(1, 0, 0))) as fillet1_2_piece_4:
        with BuildLine():
            CenterArc((2.54 + FILLET1_R, FILLET1_R), FILLET1_R, 180, 90)
            Line((2.54, FILLET1_R), (2.54, 0))
            Line((2.54, 0), (2.54 + FILLET1_R, 0))
        make_face()
    revolve(axis=Axis((-15.757525, 2.54, -1.27), (0, 1, 0)), revolution_arc=90)
    with BuildSketch(Plane(origin=(15.757525, 2.54, 20.955), x_dir=(1, 0, 0), z_dir=(0, 0, -1))) as fillet1_2_piece_5:
        with BuildLine():
            CenterArc((2.54 + FILLET1_R, -FILLET1_R), FILLET1_R, 90, 90)
            Line((2.54, -FILLET1_R), (2.54, 0))
            Line((2.54, 0), (2.54 + FILLET1_R, 0))
        make_face()
    revolve(axis=Axis((15.757525, 2.54, 20.955), (0, -1, 0)), revolution_arc=90)
    with BuildSketch(Plane(origin=(15.757525, 2.54, -1.27), x_dir=(0, 0, -1), z_dir=(-1, 0, 0))) as fillet1_2_piece_6:
        with BuildLine():
            CenterArc((2.54 + FILLET1_R, -FILLET1_R), FILLET1_R, 90, 90)
            Line((2.54, -FILLET1_R), (2.54, 0))
            Line((2.54, 0), (2.54 + FILLET1_R, 0))
        make_face()
    revolve(axis=Axis((15.757525, 2.54, -1.27), (0, -1, 0)), revolution_arc=90)

    # Sketch9 → Cut-Extrude4 (cut)
    with BuildSketch(Plane(origin=(0, 2.54, 0), x_dir=(1, 0, 0), z_dir=(0, 1, 0))):
        with BuildLine():
            Line((-30.677270284, 30.1625), (30.677270284, 30.1625))
            Line((30.677270284, 30.1625), (14.939561121, 18.716893336))
            ThreePointArc((14.939561121, 18.716893336), (0, 13.858789877), (-14.939561121, 18.716893336))
            Line((-14.939561121, 18.716893336), (-30.677270284, 30.1625))
        make_face()
        with BuildLine():
            Line((-39.6875, 20.6375), (-39.6875, -20.6375))
            ThreePointArc((-39.6875, -20.6375), (-25.711391971, 0), (-39.6875, 20.6375))
        make_face()
        with BuildLine():
            Line((39.6875, 20.6375), (39.6875, -20.6375))
            ThreePointArc((39.6875, -20.6375), (25.711391971, 0), (39.6875, 20.6375))
        make_face()
        with BuildLine():
            Line((-30.677270284, -30.1625), (30.677270284, -30.1625))
            ThreePointArc((30.677270284, -30.1625), (0, -26.401718952), (-30.677270284, -30.1625))
        make_face()
    extrude(amount=-CUT_EXTRUDE4_DEPTH, mode=Mode.SUBTRACT)

    # Fillet2
    fillet2_edges = [part.edges().sort_by_distance(p)[0] for p in [
        (-39.6875, 1.27, -20.6375),
        (-39.6875, 1.27, 20.6375),
        (-30.677270284, 1.27, 30.1625),
        (30.677270284, 1.27, 30.1625),
        (39.6875, 1.27, 20.6375),
        (39.6875, 1.27, -20.6375),
        (30.677270284, 1.27, -30.1625),
        (-30.677270284, 1.27, -30.1625),
    ]]
    fillet(fillet2_edges, radius=FILLET2_R)

    # Sketch10 → Cut-Extrude5 (cut, through all)
    with BuildSketch(Plane(origin=(0, 8.905884485, 8.905884485), x_dir=(1, 0, 0), z_dir=(0, 0.7071067811865529, 0.7071067811865422))):
        with Locations((0, -0.1378966)):
            Rectangle(SKETCH10_W, SKETCH10_H)
    extrude(amount=-CUT_EXTRUDE5_DEPTH, mode=Mode.SUBTRACT)

    # Fillet3
    fillet3_edges = [part.edges().sort_by_distance(p)[0] for p in [
        (12.7, 5.863480052, 0.221328815),
        (12.7, 2.944896812, 8.977078533),
        (-12.7, 2.944896812, 8.977078533),
        (-12.7, 5.863480052, 0.221328815),
    ]]
    fillet(fillet3_edges, radius=FILLET3_R)


solid = part.part
